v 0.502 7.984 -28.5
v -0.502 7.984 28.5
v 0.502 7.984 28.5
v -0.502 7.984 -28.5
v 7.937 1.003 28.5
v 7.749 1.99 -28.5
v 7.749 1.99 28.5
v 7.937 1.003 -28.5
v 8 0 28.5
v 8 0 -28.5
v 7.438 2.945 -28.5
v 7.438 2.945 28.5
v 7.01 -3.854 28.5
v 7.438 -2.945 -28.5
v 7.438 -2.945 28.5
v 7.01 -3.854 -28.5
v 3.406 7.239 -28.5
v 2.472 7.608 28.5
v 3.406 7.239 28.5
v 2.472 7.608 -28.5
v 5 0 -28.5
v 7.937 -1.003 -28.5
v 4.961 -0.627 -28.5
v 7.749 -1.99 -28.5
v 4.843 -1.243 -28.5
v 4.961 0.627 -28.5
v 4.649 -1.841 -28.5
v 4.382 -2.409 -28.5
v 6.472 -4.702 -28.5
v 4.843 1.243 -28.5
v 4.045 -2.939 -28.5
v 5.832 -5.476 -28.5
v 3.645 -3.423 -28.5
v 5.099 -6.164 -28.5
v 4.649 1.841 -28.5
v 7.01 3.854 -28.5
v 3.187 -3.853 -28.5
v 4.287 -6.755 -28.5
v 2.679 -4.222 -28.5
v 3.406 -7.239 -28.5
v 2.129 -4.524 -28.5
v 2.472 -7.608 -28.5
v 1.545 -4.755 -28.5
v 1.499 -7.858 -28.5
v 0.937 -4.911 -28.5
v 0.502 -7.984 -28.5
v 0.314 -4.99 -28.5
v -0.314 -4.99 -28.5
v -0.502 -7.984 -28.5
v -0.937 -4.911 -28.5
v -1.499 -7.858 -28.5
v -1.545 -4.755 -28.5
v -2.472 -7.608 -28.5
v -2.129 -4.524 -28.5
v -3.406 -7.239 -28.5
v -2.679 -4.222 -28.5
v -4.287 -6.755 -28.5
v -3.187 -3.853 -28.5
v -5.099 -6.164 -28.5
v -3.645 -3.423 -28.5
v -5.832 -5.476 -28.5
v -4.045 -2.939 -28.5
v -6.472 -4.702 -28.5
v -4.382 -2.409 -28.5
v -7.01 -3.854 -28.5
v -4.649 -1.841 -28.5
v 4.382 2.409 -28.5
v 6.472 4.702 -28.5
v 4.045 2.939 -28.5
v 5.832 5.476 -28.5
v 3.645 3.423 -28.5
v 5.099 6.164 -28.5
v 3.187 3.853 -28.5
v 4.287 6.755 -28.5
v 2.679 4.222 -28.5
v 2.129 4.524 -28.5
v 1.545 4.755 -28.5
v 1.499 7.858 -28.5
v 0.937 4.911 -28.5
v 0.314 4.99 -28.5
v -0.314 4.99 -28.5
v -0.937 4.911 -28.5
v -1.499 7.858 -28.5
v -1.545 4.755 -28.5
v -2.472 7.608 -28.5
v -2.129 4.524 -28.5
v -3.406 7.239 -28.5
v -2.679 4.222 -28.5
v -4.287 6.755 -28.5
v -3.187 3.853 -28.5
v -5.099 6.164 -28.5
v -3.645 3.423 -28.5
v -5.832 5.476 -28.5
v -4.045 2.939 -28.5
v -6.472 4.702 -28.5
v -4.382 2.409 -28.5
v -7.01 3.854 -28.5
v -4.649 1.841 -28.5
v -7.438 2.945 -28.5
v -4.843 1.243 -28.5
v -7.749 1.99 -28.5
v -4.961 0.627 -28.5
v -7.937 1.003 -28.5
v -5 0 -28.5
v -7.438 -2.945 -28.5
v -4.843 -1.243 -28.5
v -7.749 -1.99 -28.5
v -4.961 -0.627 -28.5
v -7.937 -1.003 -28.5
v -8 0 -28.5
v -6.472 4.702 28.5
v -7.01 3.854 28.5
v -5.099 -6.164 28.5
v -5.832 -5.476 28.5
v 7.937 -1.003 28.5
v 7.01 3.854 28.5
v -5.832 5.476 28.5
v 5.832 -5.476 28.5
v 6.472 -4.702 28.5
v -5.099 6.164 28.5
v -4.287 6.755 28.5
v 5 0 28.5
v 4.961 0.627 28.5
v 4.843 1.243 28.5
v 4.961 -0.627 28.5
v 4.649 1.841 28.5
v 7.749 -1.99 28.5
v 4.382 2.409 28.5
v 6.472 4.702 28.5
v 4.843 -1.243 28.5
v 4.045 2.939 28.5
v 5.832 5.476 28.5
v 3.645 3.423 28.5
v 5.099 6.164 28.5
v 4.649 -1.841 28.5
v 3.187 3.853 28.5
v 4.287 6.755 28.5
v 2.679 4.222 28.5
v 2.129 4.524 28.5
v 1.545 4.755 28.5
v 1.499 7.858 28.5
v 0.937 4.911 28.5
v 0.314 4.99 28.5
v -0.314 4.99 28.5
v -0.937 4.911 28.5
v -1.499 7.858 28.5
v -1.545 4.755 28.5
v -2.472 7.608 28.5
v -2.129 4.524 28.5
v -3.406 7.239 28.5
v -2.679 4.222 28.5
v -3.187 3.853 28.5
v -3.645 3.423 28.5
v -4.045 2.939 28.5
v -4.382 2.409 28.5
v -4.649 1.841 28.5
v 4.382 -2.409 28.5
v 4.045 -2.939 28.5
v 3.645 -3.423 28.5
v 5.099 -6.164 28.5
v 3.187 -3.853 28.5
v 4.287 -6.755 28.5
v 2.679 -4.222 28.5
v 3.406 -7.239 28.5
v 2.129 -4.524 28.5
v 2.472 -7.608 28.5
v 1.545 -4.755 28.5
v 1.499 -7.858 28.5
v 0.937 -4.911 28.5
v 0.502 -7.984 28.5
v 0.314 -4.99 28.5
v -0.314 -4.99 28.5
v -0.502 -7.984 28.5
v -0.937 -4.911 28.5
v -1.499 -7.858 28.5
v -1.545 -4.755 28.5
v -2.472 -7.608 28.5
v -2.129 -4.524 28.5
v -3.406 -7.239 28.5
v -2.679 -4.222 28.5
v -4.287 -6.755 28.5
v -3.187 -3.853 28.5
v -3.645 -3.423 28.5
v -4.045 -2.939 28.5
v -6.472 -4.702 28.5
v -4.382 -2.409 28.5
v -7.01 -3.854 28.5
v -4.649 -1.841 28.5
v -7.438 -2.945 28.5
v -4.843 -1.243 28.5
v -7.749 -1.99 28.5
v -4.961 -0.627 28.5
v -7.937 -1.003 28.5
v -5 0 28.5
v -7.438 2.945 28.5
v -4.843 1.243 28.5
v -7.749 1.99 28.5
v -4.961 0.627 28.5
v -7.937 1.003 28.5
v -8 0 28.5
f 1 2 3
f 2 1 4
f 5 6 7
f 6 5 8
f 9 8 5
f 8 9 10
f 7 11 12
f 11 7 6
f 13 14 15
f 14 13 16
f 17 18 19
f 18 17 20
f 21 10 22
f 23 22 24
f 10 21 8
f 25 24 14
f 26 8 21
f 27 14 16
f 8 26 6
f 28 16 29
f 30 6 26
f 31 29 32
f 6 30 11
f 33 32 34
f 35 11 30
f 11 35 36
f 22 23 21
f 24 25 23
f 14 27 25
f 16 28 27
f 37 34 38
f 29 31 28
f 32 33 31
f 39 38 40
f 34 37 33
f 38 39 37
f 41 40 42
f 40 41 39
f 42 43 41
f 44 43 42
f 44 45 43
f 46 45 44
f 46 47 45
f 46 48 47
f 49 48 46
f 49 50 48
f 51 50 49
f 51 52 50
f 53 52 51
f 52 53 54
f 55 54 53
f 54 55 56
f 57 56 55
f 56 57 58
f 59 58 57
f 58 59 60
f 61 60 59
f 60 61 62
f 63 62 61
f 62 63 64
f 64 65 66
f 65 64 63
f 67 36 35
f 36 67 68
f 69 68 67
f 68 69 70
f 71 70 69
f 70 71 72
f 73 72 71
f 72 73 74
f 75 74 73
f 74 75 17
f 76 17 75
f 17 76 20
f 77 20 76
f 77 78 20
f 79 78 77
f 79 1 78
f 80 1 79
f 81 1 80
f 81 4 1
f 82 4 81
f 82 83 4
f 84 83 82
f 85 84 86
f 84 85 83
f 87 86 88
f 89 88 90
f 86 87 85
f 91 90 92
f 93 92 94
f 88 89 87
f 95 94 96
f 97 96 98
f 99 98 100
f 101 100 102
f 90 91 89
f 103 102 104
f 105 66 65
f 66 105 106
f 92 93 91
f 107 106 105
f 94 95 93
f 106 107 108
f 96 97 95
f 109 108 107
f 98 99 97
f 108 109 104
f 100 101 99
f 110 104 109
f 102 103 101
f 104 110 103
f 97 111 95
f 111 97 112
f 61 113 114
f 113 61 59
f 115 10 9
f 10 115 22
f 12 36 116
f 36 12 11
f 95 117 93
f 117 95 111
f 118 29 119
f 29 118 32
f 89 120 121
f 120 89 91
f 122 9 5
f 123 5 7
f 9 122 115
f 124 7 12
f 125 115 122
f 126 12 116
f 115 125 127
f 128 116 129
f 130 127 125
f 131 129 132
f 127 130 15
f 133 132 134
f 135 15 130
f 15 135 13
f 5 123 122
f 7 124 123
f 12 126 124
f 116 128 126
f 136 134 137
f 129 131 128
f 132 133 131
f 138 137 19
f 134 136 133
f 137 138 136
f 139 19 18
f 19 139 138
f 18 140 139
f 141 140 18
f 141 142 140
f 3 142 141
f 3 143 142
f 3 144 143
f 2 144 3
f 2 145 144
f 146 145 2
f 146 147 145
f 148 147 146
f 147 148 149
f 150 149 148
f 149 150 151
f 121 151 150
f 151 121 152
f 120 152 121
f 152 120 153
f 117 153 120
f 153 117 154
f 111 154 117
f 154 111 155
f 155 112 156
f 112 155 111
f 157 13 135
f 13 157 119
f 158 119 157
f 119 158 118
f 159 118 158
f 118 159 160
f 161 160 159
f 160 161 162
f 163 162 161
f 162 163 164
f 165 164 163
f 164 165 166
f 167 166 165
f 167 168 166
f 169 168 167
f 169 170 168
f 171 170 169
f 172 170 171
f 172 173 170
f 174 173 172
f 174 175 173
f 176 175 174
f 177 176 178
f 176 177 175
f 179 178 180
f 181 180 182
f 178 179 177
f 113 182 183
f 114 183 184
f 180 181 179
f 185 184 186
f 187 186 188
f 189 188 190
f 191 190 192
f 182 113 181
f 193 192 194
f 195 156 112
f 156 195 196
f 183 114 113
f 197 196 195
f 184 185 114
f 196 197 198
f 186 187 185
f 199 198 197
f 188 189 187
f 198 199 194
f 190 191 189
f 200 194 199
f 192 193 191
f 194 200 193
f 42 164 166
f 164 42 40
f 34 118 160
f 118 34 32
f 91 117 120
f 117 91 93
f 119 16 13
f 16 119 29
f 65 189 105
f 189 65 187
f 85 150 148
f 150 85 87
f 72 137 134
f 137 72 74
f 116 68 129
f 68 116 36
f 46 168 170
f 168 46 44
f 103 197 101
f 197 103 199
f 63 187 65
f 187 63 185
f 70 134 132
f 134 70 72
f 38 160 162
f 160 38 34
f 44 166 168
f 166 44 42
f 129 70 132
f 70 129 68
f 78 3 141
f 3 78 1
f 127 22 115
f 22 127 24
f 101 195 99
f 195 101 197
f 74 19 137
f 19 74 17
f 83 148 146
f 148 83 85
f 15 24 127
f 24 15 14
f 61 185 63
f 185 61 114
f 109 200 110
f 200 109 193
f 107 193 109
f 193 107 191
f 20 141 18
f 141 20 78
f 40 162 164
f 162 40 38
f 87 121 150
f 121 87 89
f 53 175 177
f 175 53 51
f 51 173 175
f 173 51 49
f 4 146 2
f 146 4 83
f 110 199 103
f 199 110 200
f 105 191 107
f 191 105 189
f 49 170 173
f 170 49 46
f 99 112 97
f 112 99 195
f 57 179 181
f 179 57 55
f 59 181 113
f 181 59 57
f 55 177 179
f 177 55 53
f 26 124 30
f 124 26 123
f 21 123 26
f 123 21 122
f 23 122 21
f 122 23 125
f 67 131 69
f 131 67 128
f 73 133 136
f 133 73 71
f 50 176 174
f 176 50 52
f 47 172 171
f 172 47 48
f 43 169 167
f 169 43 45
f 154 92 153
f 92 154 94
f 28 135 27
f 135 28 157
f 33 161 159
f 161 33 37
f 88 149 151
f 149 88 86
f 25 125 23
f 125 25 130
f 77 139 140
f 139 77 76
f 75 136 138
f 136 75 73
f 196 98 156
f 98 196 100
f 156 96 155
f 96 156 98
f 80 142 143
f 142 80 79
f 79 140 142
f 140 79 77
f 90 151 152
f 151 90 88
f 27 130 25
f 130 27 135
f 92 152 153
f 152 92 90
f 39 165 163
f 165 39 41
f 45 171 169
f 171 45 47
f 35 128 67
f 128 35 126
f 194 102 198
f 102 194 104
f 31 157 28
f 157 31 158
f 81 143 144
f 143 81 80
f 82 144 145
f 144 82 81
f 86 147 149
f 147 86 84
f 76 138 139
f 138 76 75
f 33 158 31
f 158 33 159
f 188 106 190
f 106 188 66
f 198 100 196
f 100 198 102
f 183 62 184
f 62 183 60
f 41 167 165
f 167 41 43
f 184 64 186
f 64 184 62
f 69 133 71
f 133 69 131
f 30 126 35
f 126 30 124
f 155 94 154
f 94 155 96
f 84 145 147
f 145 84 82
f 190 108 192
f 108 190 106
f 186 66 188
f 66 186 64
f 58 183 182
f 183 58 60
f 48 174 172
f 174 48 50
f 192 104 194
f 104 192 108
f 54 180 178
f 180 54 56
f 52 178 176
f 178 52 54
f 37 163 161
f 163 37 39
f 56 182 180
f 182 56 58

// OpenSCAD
$fn = 50;


difference() {
	union() {
		translate(v = [0, 0, -28.5000000000]) {
			cylinder(h = 57, r = 8.0000000000);
		}
	}
	union() {
		translate(v = [0, 0, -100.0000000000]) {
			cylinder(h = 200, r = 5.0000000000);
		}
	}
}
